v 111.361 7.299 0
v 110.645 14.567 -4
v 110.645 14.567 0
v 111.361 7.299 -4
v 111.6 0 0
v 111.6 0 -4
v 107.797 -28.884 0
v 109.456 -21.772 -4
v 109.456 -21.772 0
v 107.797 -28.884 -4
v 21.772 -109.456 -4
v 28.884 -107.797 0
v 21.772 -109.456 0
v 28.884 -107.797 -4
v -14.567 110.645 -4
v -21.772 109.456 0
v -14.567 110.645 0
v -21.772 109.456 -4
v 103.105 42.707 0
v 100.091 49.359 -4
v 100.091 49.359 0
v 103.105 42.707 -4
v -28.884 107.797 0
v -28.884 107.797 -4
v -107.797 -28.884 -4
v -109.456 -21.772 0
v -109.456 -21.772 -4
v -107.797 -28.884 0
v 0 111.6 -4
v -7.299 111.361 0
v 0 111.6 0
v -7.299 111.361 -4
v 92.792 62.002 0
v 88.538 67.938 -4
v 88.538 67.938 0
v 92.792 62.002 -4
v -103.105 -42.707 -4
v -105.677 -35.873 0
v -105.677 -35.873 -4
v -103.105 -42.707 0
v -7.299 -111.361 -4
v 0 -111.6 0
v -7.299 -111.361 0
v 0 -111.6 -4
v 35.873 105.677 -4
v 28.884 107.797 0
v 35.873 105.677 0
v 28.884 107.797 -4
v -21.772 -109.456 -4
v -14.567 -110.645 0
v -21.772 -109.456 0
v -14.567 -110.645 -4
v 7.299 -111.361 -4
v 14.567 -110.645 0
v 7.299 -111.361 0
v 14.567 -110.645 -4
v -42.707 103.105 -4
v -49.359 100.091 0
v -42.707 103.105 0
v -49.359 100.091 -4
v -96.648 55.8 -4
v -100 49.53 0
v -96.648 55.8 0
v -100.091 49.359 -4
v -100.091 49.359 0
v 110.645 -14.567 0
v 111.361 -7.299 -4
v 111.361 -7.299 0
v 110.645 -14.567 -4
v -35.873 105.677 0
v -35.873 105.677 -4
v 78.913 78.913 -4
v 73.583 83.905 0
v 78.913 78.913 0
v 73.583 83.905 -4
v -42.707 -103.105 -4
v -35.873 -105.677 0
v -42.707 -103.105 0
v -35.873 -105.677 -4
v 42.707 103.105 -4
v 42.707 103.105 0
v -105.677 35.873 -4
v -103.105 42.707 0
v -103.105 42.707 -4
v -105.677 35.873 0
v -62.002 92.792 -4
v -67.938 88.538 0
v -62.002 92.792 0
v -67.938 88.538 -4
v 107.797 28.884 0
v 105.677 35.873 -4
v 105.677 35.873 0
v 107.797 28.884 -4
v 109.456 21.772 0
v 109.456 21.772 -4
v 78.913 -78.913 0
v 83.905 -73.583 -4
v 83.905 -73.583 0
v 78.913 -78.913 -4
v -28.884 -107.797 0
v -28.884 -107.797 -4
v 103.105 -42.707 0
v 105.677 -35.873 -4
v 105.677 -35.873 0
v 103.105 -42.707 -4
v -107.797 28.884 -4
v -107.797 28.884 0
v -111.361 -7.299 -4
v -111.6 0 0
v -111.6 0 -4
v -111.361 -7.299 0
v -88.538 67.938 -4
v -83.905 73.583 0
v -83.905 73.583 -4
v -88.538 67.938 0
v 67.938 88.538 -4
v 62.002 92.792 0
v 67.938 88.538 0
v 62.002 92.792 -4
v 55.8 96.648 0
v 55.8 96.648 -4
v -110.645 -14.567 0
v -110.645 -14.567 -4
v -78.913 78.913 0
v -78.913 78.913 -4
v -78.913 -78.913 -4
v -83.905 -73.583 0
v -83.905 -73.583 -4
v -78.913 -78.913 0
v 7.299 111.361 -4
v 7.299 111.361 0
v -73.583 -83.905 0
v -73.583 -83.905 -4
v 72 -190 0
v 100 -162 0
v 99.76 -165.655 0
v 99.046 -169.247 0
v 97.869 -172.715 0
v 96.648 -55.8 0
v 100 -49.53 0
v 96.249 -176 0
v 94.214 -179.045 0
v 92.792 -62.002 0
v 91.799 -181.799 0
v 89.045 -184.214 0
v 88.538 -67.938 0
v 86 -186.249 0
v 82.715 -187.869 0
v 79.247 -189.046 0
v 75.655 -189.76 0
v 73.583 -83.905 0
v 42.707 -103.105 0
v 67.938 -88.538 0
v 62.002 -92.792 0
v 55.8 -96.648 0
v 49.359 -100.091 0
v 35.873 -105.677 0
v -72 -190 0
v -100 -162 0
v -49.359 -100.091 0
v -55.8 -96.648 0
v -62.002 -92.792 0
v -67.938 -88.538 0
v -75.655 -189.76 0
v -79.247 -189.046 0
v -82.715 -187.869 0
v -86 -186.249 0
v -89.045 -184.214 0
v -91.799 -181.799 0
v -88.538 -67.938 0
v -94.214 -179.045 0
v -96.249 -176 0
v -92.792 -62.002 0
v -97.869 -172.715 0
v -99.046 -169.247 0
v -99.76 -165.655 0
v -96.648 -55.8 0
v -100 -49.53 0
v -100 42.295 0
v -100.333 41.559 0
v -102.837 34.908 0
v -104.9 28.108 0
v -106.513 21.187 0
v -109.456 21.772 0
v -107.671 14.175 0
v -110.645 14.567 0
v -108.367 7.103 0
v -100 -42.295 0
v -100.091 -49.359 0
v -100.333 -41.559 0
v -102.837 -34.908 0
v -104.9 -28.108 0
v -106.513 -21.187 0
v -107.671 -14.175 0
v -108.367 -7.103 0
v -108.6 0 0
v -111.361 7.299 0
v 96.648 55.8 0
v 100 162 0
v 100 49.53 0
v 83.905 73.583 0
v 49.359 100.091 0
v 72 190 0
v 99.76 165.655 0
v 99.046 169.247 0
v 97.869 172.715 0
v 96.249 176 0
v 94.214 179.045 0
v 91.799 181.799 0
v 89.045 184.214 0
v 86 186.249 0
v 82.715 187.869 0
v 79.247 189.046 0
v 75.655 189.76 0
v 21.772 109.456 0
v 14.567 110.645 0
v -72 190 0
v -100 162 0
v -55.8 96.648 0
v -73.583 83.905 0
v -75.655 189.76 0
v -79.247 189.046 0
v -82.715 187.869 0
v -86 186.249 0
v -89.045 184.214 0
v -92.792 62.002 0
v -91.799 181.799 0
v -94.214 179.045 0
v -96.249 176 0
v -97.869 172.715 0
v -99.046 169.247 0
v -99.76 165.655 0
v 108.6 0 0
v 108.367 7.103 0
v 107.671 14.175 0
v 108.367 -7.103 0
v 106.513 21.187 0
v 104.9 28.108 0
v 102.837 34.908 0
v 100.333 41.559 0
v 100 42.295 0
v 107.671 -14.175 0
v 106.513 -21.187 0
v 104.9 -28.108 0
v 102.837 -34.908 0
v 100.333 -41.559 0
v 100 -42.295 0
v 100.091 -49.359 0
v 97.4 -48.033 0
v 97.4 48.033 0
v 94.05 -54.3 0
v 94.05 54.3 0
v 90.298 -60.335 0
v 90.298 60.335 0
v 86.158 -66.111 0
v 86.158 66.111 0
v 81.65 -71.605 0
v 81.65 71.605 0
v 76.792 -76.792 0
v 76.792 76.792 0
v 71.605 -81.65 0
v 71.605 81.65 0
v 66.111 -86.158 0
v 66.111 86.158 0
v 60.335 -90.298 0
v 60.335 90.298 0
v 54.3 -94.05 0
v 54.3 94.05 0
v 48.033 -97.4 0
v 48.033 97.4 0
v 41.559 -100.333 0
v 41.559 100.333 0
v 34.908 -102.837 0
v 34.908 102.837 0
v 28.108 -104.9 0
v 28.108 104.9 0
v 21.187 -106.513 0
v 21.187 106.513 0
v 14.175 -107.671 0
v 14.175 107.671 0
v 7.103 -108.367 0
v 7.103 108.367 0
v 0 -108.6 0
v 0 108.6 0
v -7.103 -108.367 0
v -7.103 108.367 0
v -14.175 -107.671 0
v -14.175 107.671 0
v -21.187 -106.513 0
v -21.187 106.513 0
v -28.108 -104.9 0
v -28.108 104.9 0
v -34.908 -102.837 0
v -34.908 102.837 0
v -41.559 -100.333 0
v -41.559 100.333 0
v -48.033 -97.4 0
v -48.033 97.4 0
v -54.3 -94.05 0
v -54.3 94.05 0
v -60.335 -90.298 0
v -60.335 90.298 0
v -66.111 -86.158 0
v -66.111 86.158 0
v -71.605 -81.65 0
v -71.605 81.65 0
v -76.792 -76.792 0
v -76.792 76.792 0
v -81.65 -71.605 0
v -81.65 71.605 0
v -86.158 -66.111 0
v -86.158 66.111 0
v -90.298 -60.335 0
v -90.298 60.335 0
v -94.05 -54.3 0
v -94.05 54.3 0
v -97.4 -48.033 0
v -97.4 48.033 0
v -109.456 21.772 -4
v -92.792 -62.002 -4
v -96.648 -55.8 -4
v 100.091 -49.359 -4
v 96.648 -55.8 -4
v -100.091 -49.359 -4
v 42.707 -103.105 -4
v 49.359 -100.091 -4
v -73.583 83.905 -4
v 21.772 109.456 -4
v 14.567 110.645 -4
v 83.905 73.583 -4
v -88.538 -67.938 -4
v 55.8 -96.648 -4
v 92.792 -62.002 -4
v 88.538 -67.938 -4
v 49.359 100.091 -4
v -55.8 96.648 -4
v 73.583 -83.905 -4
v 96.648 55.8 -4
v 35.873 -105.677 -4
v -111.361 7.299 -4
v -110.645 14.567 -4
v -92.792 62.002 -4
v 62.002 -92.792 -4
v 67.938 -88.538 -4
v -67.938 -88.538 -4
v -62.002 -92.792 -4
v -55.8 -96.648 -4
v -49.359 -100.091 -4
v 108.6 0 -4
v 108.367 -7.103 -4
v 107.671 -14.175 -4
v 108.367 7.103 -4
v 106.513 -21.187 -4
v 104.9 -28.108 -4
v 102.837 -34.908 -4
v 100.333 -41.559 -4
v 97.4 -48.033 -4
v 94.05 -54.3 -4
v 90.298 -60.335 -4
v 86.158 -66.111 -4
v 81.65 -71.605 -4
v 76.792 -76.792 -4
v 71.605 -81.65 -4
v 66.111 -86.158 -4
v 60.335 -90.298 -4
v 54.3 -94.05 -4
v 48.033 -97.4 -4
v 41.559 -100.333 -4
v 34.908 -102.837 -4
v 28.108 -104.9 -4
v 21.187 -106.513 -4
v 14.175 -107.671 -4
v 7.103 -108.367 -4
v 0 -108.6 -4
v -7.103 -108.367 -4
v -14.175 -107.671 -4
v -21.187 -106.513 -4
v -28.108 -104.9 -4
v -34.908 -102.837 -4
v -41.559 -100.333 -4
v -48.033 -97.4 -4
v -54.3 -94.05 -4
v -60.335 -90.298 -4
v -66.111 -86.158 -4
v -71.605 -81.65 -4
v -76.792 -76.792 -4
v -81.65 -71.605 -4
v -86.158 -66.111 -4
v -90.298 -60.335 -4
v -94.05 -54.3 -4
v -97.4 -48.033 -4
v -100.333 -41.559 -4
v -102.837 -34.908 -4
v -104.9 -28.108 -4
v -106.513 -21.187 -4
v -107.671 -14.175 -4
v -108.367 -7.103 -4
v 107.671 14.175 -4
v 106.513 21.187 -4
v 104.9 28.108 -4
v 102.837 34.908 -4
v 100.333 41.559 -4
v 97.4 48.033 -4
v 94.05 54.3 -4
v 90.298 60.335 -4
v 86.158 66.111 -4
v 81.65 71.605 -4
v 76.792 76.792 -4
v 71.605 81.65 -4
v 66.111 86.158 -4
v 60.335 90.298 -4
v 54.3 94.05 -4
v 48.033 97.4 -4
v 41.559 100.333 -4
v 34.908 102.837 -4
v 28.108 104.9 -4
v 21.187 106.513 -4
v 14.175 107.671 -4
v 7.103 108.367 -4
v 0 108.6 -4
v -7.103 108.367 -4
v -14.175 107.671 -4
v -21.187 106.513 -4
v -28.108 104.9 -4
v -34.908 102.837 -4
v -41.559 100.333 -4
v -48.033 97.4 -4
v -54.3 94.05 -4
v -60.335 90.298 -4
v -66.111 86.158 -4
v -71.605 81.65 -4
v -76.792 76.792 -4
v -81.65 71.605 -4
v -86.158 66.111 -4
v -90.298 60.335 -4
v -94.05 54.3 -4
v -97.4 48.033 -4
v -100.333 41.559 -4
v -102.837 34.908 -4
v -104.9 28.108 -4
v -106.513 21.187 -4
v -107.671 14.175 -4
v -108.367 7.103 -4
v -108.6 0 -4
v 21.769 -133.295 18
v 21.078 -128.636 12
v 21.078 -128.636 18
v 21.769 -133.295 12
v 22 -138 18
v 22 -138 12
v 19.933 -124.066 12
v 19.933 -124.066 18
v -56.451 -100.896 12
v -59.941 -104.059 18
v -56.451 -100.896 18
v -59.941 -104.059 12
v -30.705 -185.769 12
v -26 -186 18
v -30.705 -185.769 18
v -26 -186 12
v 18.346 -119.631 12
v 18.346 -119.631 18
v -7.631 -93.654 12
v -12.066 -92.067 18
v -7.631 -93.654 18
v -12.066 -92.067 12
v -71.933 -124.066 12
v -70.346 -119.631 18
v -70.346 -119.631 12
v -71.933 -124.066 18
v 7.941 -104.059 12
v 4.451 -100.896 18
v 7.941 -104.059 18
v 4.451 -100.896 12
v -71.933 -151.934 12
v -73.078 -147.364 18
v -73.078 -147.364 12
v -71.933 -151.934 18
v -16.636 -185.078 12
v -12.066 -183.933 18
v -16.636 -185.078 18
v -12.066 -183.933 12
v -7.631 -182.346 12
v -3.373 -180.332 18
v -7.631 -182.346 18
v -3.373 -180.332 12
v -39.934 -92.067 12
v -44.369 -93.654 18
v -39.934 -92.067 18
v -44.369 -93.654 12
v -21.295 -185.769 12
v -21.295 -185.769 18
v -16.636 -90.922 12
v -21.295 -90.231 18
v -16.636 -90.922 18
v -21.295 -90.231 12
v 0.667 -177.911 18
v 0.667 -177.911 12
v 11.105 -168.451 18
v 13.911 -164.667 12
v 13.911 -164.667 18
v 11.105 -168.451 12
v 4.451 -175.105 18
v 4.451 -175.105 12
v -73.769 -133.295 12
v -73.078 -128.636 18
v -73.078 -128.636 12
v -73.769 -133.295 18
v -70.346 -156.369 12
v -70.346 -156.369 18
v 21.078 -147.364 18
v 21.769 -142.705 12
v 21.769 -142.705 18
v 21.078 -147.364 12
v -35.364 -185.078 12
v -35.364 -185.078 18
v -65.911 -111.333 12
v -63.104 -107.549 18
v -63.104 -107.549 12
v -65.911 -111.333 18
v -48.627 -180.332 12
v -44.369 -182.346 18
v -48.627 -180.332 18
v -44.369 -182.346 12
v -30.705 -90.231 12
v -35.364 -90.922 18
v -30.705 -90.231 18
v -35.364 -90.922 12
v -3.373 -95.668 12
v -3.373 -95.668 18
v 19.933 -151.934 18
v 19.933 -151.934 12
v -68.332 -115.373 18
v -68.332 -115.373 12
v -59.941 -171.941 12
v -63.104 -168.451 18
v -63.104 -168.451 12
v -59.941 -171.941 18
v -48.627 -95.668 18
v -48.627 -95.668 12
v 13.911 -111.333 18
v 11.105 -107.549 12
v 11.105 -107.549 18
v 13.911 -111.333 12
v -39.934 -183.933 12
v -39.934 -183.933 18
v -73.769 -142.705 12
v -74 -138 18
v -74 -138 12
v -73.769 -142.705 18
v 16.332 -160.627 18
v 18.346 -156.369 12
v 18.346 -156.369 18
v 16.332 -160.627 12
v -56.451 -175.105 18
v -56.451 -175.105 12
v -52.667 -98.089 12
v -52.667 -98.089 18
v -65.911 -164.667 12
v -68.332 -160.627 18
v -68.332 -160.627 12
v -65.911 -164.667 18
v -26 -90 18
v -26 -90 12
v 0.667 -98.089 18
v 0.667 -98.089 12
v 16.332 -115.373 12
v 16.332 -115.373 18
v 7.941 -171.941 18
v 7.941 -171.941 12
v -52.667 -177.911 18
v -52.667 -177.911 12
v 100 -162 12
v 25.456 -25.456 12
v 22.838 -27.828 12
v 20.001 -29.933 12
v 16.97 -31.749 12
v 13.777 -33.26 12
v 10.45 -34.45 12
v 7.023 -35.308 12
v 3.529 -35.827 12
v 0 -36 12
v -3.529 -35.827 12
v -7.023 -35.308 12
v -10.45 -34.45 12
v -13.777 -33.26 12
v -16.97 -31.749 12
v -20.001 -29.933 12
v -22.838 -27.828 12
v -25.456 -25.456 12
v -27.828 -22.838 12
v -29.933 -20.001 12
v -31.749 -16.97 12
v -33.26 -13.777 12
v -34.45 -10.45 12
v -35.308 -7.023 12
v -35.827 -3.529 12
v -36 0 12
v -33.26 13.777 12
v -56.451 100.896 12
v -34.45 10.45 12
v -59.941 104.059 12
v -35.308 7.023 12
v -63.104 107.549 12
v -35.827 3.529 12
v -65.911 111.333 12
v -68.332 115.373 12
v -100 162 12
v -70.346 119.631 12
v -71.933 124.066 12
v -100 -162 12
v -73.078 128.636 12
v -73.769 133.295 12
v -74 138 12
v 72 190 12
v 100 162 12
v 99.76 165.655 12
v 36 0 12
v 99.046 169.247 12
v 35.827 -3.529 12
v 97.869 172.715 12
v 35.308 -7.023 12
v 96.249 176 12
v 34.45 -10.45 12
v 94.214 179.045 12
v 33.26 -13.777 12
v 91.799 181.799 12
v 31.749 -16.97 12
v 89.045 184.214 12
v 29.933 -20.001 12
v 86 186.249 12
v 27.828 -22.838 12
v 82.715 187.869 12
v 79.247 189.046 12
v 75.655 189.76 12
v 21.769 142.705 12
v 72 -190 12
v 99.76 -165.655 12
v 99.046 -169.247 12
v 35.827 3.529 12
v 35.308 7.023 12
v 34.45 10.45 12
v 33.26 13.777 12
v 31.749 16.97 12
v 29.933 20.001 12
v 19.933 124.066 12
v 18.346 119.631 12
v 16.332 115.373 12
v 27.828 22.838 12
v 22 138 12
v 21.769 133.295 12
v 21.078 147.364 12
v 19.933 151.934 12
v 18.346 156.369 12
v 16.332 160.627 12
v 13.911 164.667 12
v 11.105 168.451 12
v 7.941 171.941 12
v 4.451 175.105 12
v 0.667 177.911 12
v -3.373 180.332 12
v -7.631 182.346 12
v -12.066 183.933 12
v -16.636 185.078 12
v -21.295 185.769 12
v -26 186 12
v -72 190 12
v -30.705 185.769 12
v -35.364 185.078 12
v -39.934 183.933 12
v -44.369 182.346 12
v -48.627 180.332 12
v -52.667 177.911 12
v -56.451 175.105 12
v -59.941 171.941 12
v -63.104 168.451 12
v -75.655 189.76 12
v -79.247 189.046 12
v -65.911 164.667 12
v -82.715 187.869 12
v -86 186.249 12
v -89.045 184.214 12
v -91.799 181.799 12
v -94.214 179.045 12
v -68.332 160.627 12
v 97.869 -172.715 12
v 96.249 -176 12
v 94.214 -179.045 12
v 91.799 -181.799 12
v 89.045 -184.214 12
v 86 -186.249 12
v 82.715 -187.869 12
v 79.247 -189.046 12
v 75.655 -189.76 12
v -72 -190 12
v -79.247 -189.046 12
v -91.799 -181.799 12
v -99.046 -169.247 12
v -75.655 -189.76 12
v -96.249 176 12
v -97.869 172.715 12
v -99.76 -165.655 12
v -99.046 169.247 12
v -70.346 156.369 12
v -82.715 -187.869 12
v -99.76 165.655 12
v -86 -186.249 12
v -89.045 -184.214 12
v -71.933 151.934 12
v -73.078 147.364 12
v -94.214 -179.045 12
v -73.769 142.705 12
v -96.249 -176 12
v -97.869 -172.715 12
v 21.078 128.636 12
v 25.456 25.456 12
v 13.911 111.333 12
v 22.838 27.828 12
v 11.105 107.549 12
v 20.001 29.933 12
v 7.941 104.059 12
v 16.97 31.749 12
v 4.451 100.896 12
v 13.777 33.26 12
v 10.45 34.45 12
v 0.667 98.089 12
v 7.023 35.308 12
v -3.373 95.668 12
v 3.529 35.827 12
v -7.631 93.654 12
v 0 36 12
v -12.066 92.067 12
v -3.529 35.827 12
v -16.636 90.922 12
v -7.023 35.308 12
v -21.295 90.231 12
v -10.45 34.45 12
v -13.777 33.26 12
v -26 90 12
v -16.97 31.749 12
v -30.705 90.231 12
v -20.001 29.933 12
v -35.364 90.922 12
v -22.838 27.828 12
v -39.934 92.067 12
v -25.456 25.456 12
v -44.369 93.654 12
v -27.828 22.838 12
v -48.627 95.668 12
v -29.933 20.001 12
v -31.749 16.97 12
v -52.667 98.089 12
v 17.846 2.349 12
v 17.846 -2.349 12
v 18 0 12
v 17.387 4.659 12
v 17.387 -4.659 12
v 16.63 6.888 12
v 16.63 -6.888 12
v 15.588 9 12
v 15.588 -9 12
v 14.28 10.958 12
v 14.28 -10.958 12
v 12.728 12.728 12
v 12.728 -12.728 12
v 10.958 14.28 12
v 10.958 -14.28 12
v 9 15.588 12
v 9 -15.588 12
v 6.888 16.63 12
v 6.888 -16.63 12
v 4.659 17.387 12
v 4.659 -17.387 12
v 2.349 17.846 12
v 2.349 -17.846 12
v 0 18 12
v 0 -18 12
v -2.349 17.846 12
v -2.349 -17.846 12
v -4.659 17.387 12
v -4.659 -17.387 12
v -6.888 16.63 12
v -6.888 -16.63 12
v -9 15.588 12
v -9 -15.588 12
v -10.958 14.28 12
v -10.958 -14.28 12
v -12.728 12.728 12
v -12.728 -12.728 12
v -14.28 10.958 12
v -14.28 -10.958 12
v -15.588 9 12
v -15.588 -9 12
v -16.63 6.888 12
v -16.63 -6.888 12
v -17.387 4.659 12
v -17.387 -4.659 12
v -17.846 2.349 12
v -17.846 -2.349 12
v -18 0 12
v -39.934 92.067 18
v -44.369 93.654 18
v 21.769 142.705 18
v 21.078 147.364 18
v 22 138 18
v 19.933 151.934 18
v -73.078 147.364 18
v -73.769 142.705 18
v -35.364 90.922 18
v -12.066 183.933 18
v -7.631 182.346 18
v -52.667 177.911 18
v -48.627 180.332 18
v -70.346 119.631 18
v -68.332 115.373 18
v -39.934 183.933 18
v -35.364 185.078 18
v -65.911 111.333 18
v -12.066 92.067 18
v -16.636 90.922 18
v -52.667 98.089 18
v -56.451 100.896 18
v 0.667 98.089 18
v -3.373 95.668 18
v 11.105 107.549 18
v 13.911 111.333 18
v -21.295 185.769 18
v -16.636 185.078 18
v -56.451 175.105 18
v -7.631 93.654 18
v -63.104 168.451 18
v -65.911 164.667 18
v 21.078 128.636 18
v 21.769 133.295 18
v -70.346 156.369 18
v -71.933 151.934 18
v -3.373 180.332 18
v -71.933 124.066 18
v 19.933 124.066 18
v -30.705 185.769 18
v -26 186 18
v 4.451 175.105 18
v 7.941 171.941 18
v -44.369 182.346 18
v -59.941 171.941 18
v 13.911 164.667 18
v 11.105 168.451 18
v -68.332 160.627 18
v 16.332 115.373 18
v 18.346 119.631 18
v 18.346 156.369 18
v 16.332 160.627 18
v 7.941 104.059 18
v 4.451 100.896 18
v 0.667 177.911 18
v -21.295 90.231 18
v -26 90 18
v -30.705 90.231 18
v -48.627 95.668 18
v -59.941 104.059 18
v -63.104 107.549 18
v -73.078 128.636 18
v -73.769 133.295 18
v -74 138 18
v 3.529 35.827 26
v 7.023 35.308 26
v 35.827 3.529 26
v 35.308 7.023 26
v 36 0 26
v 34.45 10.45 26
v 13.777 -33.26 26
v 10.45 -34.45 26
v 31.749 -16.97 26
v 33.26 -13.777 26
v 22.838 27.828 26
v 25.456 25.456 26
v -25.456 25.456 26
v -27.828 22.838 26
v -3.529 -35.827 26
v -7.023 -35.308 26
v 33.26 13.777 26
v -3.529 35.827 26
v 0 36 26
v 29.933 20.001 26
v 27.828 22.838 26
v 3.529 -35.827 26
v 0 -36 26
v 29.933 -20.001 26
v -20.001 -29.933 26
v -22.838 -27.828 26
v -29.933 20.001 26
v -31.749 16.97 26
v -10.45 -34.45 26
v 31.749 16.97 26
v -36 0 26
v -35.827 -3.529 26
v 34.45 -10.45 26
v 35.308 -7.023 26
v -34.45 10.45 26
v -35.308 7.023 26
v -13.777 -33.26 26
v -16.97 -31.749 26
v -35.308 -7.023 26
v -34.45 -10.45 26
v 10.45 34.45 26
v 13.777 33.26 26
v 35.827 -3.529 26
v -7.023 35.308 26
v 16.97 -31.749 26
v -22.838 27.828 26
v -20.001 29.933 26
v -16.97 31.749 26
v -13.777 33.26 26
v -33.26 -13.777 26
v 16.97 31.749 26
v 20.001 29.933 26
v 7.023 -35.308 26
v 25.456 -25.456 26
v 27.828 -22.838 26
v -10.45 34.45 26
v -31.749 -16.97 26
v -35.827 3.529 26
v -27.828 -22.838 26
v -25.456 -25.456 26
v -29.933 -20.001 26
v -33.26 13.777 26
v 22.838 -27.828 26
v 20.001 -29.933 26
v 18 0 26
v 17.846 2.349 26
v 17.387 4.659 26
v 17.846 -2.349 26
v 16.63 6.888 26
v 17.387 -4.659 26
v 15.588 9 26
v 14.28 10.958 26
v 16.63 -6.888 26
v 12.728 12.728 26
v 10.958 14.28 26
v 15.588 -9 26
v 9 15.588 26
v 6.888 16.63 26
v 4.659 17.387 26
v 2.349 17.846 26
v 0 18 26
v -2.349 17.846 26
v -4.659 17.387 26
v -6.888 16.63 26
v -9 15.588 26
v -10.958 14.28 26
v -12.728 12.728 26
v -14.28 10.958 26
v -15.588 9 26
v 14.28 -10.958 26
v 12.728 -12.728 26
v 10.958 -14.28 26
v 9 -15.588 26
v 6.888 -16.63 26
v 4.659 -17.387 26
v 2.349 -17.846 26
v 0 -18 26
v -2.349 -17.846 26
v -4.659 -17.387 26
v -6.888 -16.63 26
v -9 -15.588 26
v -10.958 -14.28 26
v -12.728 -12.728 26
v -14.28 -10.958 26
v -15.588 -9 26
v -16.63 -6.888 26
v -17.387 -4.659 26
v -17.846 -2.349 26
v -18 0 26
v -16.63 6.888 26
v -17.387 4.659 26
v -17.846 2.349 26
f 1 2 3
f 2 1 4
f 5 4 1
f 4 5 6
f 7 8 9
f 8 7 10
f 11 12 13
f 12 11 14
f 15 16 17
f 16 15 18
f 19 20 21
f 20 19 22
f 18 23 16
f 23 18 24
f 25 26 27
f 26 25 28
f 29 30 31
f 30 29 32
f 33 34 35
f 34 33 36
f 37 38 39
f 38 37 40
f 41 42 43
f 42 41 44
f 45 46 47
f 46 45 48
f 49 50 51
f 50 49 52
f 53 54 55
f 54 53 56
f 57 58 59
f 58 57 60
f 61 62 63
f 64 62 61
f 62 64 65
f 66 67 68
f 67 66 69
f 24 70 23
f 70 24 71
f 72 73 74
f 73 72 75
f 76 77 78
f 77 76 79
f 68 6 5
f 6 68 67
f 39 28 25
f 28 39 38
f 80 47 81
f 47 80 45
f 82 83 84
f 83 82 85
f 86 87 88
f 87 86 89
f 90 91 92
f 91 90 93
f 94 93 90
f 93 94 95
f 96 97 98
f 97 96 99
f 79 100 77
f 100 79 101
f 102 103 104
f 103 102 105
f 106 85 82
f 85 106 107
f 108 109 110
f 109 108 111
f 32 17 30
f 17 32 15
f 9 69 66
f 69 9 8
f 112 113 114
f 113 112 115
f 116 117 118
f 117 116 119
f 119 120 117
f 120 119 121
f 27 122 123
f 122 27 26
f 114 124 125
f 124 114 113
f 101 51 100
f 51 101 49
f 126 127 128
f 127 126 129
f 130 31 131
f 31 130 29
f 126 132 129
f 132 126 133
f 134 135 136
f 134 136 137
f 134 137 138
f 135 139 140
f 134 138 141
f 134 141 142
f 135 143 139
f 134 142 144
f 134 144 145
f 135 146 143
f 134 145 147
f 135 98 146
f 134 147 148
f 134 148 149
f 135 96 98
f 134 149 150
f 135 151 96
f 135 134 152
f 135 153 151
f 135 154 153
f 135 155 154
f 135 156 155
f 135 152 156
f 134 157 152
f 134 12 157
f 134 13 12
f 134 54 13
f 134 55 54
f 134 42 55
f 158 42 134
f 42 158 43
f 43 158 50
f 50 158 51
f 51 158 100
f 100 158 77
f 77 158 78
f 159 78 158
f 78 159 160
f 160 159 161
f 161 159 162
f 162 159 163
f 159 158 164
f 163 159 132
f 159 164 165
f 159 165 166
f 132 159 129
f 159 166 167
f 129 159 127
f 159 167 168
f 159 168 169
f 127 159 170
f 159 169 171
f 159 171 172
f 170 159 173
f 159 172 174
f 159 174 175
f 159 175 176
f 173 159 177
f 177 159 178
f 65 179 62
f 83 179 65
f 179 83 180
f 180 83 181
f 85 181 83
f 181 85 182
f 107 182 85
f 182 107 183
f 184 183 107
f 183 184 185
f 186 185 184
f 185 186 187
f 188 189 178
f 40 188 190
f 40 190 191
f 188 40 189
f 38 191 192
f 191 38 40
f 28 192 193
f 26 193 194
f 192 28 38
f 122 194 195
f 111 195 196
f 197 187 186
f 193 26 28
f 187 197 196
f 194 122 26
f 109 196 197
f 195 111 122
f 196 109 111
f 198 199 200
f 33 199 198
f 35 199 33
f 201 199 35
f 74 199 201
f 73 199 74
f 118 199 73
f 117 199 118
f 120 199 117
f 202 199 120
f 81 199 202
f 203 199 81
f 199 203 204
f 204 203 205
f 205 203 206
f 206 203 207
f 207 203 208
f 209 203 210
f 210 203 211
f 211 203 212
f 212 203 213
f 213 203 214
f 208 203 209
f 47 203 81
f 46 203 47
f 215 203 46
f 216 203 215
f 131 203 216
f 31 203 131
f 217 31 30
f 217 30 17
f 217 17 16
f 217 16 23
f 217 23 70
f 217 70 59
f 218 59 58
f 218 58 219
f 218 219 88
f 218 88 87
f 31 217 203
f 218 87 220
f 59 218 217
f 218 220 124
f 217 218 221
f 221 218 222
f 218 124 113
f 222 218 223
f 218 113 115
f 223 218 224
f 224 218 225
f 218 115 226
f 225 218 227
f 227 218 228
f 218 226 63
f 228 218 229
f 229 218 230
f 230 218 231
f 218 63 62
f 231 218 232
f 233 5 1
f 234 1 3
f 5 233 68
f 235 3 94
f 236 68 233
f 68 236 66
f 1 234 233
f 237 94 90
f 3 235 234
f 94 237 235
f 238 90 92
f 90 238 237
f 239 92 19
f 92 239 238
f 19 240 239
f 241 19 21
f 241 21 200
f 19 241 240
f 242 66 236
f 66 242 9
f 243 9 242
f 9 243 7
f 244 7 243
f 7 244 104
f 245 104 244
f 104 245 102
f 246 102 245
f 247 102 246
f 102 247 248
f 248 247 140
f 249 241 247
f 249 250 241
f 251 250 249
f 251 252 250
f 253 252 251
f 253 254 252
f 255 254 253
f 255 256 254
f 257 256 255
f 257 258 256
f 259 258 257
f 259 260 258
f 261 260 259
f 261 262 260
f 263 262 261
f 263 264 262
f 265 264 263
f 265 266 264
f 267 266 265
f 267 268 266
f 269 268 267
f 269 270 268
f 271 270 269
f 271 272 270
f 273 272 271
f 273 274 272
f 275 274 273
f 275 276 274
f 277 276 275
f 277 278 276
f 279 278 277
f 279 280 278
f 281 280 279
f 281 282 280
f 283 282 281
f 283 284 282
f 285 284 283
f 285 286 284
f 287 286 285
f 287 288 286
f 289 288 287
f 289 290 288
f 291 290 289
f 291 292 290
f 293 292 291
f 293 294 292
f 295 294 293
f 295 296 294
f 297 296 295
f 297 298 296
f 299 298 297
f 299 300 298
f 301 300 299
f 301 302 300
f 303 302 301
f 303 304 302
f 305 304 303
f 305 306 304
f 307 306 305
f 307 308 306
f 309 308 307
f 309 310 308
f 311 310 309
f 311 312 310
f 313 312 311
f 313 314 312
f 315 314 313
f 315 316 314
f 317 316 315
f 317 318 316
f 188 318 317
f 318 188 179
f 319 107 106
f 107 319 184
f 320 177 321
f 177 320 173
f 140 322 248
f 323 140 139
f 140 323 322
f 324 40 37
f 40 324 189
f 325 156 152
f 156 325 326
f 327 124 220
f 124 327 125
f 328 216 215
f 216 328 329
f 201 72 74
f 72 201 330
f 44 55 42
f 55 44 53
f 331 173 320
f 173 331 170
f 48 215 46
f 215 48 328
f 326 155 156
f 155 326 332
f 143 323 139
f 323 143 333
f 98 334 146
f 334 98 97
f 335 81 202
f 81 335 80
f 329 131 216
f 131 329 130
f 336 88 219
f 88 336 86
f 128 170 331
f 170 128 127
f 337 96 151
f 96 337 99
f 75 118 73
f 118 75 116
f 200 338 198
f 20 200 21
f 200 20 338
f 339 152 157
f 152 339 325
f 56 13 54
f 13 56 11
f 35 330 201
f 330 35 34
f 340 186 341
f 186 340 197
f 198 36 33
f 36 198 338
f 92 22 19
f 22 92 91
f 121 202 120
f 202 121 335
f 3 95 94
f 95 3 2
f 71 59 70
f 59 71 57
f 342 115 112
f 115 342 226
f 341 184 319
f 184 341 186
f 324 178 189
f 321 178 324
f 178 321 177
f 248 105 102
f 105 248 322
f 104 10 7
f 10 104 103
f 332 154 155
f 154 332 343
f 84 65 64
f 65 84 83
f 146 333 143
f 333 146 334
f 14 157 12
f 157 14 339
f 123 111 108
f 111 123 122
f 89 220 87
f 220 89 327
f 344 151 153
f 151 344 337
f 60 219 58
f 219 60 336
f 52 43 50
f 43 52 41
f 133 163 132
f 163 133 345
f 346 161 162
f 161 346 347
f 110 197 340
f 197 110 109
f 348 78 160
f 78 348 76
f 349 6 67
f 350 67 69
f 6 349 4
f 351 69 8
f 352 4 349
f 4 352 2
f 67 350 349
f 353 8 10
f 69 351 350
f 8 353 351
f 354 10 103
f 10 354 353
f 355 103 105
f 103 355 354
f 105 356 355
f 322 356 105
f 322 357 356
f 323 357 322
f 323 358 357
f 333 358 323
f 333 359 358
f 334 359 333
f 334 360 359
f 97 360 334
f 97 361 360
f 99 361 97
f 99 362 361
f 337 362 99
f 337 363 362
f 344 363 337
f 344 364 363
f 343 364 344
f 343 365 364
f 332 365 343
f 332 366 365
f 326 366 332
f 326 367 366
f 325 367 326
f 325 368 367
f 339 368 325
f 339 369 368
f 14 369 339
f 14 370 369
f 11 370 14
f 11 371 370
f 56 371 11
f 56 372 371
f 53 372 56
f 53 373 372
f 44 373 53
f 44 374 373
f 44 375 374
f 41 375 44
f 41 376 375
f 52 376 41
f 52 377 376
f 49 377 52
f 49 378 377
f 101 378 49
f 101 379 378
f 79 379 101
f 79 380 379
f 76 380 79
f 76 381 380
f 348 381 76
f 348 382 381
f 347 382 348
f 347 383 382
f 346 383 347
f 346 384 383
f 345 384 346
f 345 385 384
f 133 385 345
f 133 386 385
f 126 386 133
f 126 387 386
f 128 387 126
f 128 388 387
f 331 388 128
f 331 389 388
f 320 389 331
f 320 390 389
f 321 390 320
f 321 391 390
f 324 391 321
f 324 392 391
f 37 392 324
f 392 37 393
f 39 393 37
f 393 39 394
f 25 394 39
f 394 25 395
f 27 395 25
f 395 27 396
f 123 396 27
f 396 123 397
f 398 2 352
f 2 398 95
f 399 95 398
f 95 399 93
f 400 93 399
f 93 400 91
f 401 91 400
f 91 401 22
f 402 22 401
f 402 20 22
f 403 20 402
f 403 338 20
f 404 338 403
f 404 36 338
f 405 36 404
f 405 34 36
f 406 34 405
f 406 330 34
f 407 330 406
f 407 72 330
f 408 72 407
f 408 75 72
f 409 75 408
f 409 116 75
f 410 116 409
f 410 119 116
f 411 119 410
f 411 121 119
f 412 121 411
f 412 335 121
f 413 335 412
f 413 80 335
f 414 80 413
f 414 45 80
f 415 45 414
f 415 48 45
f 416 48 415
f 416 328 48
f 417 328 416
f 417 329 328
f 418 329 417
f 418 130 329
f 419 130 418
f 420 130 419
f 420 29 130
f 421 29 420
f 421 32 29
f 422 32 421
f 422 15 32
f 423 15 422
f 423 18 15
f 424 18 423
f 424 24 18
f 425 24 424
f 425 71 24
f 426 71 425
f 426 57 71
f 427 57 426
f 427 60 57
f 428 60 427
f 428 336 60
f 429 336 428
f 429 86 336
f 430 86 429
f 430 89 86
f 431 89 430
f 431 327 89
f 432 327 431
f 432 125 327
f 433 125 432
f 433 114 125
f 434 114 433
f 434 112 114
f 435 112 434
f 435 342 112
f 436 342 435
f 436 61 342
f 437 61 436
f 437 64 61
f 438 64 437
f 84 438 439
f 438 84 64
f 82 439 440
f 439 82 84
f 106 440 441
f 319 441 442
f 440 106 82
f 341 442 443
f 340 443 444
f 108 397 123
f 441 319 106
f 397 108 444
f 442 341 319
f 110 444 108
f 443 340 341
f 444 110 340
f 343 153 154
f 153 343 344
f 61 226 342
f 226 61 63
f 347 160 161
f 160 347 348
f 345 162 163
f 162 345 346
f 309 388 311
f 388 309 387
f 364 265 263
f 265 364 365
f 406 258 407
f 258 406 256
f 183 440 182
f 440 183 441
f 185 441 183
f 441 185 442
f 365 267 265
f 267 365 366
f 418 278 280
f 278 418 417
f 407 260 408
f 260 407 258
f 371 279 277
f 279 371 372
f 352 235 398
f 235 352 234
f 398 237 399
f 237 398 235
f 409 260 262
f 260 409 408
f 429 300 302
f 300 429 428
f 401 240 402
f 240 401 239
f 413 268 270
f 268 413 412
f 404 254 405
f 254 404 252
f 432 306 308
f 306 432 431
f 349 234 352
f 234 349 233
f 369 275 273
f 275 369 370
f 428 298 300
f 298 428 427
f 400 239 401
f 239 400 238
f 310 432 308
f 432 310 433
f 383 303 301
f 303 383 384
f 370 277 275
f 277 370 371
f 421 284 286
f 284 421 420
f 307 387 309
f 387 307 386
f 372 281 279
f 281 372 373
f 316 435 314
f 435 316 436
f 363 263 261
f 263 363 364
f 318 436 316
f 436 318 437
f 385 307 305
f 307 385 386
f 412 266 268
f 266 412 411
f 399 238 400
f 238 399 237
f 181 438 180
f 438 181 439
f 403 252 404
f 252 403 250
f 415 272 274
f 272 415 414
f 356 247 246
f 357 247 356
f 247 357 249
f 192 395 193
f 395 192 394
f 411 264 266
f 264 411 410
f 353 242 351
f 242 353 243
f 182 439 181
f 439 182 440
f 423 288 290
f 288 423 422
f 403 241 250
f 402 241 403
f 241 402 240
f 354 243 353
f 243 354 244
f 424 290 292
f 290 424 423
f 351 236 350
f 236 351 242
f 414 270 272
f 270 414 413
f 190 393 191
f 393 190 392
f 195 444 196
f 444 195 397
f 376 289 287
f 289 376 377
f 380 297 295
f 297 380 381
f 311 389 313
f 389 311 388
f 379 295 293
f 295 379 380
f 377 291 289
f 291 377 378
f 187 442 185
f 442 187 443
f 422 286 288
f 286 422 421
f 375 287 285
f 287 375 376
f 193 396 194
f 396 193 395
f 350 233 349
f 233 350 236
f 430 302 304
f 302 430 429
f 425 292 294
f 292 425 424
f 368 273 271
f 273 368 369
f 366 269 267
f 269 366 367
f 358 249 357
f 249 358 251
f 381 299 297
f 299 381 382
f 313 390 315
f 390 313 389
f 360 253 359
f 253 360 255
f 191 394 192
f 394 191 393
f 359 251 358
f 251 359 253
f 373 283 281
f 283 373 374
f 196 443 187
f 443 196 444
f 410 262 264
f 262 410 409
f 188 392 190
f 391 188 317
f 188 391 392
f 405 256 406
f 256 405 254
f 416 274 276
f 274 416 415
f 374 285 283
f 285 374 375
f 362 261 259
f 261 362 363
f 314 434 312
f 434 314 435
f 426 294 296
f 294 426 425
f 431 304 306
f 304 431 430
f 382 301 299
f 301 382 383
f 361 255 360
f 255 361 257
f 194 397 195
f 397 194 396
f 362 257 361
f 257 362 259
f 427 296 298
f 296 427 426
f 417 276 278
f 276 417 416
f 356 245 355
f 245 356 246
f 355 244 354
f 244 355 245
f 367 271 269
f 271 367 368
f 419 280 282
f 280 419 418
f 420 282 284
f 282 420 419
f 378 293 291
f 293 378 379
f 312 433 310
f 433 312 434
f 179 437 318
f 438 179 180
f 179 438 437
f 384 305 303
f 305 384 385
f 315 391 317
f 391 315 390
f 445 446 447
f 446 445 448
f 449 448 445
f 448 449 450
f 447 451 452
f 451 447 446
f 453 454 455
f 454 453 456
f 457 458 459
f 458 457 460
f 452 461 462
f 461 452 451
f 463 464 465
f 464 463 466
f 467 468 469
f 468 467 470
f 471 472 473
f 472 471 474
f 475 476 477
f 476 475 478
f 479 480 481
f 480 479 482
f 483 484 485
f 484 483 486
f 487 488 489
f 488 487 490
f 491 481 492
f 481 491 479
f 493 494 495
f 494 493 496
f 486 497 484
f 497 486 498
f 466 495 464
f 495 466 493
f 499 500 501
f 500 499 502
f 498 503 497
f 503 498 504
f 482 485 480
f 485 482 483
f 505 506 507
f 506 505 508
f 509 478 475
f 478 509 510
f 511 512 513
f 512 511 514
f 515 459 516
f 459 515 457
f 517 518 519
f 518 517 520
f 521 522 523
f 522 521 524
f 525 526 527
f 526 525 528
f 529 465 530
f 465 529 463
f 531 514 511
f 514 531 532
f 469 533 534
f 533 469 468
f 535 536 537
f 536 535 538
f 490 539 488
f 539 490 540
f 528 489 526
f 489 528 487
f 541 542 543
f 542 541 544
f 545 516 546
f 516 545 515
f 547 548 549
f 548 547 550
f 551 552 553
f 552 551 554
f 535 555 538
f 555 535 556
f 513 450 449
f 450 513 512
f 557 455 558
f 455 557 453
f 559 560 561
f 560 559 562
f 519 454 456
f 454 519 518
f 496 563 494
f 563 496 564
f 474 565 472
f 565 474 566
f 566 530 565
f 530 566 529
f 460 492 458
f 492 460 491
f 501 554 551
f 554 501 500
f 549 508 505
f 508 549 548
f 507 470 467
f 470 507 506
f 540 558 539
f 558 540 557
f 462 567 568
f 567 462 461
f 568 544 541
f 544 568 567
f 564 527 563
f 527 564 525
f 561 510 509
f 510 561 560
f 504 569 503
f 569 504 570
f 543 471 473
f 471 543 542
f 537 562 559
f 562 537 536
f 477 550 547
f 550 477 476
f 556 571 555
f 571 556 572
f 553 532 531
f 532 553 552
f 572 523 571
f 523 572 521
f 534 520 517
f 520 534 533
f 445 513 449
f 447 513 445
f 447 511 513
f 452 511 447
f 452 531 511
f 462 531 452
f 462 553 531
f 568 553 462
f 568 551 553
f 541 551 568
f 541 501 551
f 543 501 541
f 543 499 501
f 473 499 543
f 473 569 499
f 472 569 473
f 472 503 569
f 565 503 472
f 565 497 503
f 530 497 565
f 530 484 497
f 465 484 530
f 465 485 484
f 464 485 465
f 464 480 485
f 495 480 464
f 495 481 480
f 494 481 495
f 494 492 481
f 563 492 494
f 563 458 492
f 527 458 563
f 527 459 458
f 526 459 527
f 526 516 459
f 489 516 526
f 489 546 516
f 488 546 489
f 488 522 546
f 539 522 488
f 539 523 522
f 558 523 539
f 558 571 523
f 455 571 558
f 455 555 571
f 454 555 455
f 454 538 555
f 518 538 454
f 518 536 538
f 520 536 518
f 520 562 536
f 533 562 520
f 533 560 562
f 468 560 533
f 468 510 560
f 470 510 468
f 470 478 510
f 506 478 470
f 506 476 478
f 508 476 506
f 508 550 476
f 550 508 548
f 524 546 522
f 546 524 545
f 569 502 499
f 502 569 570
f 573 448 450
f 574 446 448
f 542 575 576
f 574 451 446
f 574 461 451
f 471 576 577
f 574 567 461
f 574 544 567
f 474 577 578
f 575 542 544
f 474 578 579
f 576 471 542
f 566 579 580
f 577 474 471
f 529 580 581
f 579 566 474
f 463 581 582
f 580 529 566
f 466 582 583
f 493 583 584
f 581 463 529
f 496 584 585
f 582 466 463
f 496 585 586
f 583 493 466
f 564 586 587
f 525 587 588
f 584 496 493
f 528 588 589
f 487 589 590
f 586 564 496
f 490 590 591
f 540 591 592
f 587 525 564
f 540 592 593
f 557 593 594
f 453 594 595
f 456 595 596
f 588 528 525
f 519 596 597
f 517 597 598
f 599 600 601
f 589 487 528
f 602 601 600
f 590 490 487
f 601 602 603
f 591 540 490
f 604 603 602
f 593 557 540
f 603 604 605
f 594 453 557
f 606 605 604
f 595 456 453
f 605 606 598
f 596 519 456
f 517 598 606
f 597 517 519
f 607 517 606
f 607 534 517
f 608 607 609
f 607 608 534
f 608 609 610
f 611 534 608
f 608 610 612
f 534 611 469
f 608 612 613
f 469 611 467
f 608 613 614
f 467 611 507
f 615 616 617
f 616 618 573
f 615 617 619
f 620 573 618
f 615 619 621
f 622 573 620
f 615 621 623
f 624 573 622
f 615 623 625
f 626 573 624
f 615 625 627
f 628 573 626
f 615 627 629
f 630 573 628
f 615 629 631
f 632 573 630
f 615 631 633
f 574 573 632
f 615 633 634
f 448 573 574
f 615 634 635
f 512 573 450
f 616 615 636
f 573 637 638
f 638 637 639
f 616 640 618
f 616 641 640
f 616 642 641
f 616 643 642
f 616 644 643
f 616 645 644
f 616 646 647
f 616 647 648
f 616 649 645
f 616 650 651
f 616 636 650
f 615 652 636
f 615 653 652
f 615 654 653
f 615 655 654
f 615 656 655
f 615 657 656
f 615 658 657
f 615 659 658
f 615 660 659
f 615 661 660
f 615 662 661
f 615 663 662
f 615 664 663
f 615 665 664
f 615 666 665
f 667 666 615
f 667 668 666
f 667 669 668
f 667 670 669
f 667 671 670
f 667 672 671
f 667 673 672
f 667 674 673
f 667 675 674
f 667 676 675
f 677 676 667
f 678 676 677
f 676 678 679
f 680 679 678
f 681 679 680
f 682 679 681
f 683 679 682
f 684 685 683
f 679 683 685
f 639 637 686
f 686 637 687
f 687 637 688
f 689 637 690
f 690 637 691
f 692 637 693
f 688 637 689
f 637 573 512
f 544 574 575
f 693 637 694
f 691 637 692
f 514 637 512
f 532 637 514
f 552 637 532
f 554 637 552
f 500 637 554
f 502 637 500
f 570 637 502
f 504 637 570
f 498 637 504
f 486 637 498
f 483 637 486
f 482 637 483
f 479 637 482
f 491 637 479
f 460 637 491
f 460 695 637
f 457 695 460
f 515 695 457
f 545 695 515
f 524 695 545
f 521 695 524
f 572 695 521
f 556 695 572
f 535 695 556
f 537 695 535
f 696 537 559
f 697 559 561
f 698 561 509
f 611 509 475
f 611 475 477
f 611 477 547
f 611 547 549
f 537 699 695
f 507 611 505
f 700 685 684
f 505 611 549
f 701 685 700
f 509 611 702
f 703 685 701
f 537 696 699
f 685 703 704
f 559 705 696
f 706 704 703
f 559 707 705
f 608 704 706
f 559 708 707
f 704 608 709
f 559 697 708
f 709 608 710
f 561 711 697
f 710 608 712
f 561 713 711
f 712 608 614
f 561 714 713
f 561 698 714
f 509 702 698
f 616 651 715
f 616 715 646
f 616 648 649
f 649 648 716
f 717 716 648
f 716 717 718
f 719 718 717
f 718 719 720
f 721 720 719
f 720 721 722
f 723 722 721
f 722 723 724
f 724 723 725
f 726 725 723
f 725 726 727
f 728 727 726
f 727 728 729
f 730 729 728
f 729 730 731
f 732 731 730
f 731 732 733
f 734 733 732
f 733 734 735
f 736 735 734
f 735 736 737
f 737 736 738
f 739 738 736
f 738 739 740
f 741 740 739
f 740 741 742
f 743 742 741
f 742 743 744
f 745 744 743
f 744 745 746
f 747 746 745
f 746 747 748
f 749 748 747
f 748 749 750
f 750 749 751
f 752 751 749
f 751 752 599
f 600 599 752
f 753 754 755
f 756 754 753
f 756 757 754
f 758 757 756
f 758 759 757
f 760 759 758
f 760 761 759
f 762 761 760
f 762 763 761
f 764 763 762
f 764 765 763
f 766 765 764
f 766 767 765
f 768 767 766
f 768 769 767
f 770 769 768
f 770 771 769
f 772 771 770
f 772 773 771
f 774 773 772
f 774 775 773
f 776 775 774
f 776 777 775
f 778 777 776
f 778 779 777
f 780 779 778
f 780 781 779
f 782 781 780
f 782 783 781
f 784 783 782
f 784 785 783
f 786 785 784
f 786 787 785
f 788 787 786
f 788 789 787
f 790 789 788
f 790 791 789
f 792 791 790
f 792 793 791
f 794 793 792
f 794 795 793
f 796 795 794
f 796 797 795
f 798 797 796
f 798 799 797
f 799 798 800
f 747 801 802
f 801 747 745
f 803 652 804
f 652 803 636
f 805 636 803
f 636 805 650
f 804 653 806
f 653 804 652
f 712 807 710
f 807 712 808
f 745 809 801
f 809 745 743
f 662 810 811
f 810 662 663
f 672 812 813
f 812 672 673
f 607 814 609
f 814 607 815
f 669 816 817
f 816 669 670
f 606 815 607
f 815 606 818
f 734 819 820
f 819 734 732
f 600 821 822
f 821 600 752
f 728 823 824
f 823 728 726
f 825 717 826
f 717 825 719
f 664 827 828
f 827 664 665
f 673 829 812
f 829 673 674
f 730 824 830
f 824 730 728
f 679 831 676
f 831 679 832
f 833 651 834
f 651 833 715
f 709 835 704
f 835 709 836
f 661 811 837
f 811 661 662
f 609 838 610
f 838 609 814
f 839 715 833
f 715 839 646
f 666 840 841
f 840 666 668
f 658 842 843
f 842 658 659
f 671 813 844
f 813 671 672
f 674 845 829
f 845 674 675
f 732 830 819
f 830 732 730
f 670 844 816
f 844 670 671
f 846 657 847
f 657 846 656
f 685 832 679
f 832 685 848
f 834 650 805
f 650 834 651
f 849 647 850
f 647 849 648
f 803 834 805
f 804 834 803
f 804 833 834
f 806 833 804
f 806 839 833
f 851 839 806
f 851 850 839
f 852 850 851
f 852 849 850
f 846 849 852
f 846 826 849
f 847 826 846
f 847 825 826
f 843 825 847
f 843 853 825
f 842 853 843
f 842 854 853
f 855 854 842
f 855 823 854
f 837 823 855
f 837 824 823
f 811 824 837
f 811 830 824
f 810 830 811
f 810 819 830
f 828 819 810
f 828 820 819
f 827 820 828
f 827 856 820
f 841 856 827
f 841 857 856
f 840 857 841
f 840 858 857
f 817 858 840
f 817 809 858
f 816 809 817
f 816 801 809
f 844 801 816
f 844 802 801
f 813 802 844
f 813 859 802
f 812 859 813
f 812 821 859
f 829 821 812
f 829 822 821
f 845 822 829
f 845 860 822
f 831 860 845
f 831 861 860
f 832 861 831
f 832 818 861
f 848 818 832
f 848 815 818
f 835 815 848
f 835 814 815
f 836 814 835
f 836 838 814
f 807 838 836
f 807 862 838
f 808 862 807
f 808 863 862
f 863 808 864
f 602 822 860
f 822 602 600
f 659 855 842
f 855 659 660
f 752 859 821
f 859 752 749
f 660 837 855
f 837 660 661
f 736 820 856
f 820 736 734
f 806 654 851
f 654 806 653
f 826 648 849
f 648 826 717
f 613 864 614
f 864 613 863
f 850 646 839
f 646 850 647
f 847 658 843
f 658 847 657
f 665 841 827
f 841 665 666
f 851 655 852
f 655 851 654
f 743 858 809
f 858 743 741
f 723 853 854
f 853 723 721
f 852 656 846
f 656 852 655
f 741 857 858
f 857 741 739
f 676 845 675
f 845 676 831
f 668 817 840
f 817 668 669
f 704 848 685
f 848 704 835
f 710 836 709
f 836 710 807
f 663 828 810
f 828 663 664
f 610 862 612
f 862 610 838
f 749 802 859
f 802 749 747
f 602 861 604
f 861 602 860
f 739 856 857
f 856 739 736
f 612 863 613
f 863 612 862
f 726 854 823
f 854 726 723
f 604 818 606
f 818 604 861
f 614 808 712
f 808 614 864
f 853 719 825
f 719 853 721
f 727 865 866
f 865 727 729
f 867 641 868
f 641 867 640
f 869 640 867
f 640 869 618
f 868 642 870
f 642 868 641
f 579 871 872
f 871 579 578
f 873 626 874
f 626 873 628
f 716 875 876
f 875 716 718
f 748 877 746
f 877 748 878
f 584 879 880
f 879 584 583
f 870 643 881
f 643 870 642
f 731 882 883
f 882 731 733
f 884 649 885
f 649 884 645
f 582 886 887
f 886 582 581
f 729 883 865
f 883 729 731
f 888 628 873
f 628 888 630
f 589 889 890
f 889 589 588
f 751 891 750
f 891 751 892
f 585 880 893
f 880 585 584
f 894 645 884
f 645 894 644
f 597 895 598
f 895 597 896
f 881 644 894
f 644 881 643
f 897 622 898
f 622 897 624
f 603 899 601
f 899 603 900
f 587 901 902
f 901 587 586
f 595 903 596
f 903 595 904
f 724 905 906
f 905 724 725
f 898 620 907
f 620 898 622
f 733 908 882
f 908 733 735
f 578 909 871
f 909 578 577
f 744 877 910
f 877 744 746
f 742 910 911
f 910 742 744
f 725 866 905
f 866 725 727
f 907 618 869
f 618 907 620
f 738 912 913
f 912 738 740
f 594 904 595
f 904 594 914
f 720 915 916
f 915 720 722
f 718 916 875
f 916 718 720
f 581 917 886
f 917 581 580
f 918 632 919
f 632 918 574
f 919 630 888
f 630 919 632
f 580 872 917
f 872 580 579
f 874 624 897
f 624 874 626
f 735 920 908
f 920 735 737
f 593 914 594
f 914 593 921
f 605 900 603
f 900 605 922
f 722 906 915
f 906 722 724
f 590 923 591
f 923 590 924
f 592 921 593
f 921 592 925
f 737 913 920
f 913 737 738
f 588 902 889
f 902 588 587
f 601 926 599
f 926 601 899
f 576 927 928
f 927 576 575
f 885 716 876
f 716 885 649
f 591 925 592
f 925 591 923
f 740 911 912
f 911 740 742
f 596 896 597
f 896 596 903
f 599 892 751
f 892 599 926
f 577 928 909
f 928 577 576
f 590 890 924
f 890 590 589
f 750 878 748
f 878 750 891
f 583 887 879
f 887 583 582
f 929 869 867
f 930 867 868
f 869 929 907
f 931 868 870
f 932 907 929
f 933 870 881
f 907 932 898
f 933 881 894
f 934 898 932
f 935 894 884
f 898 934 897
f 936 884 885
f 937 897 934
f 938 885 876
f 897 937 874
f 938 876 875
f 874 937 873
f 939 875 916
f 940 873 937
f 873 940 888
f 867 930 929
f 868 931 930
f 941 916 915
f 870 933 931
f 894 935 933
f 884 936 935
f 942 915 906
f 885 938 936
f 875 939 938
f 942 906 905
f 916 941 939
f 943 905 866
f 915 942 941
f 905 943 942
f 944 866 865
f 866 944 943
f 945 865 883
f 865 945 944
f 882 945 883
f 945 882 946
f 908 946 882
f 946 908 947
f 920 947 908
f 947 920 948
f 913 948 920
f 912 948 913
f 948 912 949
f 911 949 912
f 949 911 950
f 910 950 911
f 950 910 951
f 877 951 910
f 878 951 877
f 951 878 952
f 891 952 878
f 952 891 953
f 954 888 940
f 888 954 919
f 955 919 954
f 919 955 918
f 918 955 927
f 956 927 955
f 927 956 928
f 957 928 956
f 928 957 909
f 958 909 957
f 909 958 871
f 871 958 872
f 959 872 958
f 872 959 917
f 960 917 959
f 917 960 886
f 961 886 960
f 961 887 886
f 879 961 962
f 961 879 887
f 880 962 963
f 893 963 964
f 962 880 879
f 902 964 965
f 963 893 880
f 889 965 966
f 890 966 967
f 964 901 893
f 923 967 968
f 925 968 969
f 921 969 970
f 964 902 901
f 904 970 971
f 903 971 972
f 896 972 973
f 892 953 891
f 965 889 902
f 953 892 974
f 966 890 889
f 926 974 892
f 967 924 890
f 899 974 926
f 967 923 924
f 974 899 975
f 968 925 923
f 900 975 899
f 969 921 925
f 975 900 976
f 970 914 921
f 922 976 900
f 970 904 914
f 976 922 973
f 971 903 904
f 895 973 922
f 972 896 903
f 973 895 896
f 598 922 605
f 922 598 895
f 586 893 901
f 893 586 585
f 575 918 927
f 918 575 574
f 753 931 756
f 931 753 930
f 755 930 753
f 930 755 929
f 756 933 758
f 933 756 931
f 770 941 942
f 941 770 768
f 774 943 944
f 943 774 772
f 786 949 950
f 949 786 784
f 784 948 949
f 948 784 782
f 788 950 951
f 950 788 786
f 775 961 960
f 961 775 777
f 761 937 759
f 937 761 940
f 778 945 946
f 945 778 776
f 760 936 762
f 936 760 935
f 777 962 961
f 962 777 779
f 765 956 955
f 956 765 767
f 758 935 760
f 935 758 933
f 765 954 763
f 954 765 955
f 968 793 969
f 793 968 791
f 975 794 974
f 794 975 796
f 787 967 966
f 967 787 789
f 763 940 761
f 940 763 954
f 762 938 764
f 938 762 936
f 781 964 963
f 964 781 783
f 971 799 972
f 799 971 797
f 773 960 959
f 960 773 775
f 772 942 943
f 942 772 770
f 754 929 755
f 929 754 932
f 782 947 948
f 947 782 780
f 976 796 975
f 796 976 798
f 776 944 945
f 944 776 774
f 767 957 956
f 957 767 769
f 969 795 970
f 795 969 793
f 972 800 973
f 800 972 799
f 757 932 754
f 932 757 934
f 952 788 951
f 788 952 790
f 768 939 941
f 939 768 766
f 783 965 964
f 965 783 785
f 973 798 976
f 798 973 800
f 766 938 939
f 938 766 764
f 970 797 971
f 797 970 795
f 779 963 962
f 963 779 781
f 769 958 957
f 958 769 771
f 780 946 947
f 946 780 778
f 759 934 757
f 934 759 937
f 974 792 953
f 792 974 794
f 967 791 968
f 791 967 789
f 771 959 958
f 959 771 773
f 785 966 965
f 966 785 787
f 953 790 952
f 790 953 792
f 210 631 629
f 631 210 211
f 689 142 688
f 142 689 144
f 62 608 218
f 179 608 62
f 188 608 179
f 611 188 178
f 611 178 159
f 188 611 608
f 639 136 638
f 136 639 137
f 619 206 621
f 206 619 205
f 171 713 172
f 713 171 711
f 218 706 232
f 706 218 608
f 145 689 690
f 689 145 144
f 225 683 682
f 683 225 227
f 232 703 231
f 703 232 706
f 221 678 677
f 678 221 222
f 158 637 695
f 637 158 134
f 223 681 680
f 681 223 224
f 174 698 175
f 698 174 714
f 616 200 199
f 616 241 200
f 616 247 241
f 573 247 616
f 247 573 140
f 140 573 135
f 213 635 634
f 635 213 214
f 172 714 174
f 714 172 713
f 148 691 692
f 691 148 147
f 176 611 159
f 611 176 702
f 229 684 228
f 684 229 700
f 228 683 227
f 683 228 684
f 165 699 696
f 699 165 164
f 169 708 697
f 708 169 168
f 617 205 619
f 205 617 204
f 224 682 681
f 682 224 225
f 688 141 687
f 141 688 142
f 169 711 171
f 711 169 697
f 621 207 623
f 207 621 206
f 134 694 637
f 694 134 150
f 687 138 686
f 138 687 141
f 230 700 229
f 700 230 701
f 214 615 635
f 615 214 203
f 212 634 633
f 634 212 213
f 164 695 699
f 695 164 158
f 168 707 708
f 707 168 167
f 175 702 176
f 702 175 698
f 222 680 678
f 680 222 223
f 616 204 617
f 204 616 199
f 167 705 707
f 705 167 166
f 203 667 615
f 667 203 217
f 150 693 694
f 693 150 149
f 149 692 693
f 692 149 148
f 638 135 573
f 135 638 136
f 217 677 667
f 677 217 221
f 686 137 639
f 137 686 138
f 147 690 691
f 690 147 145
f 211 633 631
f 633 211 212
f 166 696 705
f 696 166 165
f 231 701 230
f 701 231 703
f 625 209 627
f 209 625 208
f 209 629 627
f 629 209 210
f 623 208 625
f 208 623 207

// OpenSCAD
// HouseHand shoulder deck — dual SO-101 pads + neck boss.
// Units: mm. Flat on bed. Prefer: python3 scripts/gen_structure_kit.py

plate_x = 200;
plate_y = 380;
plate_z = 12;
corner_r = 28;

pad_x = -26;
pad_half_y = 138;
pad_r = 48;
pad_z = 6;

torso_od = 216;
ring_clear = 0.6;
ring_z = 4;

neck_boss_r = 36;
neck_boss_z = 14;
neck_hole_r = 18;

module rounded_plate(wx, wy, hz, r) {
  hull() for (sx = [-1, 1], sy = [-1, 1])
    translate([sx * (wx/2 - r), sy * (wy/2 - r), 0])
      cylinder(h = hz, r = r, $fn = 48);
}

difference() {
  union() {
    rounded_plate(plate_x, plate_y, plate_z, corner_r);
    // registration ring (underside)
    translate([0, 0, -ring_z])
      difference() {
        cylinder(h = ring_z, r = torso_od/2 + ring_clear + 3, $fn = 96);
        translate([0, 0, -0.1])
          cylinder(h = ring_z + 0.2, r = torso_od/2 + ring_clear, $fn = 96);
      }
    // SO-101 pads
    for (sy = [-1, 1]) {
      translate([pad_x, sy * pad_half_y, plate_z])
        cylinder(h = pad_z, r = pad_r, $fn = 64);
    }
    // neck boss
    translate([0, 0, plate_z])
      difference() {
        cylinder(h = neck_boss_z, r = neck_boss_r, $fn = 64);
        translate([0, 0, -0.1])
          cylinder(h = neck_boss_z + 0.2, r = neck_hole_r, $fn = 48);
      }
  }
}
